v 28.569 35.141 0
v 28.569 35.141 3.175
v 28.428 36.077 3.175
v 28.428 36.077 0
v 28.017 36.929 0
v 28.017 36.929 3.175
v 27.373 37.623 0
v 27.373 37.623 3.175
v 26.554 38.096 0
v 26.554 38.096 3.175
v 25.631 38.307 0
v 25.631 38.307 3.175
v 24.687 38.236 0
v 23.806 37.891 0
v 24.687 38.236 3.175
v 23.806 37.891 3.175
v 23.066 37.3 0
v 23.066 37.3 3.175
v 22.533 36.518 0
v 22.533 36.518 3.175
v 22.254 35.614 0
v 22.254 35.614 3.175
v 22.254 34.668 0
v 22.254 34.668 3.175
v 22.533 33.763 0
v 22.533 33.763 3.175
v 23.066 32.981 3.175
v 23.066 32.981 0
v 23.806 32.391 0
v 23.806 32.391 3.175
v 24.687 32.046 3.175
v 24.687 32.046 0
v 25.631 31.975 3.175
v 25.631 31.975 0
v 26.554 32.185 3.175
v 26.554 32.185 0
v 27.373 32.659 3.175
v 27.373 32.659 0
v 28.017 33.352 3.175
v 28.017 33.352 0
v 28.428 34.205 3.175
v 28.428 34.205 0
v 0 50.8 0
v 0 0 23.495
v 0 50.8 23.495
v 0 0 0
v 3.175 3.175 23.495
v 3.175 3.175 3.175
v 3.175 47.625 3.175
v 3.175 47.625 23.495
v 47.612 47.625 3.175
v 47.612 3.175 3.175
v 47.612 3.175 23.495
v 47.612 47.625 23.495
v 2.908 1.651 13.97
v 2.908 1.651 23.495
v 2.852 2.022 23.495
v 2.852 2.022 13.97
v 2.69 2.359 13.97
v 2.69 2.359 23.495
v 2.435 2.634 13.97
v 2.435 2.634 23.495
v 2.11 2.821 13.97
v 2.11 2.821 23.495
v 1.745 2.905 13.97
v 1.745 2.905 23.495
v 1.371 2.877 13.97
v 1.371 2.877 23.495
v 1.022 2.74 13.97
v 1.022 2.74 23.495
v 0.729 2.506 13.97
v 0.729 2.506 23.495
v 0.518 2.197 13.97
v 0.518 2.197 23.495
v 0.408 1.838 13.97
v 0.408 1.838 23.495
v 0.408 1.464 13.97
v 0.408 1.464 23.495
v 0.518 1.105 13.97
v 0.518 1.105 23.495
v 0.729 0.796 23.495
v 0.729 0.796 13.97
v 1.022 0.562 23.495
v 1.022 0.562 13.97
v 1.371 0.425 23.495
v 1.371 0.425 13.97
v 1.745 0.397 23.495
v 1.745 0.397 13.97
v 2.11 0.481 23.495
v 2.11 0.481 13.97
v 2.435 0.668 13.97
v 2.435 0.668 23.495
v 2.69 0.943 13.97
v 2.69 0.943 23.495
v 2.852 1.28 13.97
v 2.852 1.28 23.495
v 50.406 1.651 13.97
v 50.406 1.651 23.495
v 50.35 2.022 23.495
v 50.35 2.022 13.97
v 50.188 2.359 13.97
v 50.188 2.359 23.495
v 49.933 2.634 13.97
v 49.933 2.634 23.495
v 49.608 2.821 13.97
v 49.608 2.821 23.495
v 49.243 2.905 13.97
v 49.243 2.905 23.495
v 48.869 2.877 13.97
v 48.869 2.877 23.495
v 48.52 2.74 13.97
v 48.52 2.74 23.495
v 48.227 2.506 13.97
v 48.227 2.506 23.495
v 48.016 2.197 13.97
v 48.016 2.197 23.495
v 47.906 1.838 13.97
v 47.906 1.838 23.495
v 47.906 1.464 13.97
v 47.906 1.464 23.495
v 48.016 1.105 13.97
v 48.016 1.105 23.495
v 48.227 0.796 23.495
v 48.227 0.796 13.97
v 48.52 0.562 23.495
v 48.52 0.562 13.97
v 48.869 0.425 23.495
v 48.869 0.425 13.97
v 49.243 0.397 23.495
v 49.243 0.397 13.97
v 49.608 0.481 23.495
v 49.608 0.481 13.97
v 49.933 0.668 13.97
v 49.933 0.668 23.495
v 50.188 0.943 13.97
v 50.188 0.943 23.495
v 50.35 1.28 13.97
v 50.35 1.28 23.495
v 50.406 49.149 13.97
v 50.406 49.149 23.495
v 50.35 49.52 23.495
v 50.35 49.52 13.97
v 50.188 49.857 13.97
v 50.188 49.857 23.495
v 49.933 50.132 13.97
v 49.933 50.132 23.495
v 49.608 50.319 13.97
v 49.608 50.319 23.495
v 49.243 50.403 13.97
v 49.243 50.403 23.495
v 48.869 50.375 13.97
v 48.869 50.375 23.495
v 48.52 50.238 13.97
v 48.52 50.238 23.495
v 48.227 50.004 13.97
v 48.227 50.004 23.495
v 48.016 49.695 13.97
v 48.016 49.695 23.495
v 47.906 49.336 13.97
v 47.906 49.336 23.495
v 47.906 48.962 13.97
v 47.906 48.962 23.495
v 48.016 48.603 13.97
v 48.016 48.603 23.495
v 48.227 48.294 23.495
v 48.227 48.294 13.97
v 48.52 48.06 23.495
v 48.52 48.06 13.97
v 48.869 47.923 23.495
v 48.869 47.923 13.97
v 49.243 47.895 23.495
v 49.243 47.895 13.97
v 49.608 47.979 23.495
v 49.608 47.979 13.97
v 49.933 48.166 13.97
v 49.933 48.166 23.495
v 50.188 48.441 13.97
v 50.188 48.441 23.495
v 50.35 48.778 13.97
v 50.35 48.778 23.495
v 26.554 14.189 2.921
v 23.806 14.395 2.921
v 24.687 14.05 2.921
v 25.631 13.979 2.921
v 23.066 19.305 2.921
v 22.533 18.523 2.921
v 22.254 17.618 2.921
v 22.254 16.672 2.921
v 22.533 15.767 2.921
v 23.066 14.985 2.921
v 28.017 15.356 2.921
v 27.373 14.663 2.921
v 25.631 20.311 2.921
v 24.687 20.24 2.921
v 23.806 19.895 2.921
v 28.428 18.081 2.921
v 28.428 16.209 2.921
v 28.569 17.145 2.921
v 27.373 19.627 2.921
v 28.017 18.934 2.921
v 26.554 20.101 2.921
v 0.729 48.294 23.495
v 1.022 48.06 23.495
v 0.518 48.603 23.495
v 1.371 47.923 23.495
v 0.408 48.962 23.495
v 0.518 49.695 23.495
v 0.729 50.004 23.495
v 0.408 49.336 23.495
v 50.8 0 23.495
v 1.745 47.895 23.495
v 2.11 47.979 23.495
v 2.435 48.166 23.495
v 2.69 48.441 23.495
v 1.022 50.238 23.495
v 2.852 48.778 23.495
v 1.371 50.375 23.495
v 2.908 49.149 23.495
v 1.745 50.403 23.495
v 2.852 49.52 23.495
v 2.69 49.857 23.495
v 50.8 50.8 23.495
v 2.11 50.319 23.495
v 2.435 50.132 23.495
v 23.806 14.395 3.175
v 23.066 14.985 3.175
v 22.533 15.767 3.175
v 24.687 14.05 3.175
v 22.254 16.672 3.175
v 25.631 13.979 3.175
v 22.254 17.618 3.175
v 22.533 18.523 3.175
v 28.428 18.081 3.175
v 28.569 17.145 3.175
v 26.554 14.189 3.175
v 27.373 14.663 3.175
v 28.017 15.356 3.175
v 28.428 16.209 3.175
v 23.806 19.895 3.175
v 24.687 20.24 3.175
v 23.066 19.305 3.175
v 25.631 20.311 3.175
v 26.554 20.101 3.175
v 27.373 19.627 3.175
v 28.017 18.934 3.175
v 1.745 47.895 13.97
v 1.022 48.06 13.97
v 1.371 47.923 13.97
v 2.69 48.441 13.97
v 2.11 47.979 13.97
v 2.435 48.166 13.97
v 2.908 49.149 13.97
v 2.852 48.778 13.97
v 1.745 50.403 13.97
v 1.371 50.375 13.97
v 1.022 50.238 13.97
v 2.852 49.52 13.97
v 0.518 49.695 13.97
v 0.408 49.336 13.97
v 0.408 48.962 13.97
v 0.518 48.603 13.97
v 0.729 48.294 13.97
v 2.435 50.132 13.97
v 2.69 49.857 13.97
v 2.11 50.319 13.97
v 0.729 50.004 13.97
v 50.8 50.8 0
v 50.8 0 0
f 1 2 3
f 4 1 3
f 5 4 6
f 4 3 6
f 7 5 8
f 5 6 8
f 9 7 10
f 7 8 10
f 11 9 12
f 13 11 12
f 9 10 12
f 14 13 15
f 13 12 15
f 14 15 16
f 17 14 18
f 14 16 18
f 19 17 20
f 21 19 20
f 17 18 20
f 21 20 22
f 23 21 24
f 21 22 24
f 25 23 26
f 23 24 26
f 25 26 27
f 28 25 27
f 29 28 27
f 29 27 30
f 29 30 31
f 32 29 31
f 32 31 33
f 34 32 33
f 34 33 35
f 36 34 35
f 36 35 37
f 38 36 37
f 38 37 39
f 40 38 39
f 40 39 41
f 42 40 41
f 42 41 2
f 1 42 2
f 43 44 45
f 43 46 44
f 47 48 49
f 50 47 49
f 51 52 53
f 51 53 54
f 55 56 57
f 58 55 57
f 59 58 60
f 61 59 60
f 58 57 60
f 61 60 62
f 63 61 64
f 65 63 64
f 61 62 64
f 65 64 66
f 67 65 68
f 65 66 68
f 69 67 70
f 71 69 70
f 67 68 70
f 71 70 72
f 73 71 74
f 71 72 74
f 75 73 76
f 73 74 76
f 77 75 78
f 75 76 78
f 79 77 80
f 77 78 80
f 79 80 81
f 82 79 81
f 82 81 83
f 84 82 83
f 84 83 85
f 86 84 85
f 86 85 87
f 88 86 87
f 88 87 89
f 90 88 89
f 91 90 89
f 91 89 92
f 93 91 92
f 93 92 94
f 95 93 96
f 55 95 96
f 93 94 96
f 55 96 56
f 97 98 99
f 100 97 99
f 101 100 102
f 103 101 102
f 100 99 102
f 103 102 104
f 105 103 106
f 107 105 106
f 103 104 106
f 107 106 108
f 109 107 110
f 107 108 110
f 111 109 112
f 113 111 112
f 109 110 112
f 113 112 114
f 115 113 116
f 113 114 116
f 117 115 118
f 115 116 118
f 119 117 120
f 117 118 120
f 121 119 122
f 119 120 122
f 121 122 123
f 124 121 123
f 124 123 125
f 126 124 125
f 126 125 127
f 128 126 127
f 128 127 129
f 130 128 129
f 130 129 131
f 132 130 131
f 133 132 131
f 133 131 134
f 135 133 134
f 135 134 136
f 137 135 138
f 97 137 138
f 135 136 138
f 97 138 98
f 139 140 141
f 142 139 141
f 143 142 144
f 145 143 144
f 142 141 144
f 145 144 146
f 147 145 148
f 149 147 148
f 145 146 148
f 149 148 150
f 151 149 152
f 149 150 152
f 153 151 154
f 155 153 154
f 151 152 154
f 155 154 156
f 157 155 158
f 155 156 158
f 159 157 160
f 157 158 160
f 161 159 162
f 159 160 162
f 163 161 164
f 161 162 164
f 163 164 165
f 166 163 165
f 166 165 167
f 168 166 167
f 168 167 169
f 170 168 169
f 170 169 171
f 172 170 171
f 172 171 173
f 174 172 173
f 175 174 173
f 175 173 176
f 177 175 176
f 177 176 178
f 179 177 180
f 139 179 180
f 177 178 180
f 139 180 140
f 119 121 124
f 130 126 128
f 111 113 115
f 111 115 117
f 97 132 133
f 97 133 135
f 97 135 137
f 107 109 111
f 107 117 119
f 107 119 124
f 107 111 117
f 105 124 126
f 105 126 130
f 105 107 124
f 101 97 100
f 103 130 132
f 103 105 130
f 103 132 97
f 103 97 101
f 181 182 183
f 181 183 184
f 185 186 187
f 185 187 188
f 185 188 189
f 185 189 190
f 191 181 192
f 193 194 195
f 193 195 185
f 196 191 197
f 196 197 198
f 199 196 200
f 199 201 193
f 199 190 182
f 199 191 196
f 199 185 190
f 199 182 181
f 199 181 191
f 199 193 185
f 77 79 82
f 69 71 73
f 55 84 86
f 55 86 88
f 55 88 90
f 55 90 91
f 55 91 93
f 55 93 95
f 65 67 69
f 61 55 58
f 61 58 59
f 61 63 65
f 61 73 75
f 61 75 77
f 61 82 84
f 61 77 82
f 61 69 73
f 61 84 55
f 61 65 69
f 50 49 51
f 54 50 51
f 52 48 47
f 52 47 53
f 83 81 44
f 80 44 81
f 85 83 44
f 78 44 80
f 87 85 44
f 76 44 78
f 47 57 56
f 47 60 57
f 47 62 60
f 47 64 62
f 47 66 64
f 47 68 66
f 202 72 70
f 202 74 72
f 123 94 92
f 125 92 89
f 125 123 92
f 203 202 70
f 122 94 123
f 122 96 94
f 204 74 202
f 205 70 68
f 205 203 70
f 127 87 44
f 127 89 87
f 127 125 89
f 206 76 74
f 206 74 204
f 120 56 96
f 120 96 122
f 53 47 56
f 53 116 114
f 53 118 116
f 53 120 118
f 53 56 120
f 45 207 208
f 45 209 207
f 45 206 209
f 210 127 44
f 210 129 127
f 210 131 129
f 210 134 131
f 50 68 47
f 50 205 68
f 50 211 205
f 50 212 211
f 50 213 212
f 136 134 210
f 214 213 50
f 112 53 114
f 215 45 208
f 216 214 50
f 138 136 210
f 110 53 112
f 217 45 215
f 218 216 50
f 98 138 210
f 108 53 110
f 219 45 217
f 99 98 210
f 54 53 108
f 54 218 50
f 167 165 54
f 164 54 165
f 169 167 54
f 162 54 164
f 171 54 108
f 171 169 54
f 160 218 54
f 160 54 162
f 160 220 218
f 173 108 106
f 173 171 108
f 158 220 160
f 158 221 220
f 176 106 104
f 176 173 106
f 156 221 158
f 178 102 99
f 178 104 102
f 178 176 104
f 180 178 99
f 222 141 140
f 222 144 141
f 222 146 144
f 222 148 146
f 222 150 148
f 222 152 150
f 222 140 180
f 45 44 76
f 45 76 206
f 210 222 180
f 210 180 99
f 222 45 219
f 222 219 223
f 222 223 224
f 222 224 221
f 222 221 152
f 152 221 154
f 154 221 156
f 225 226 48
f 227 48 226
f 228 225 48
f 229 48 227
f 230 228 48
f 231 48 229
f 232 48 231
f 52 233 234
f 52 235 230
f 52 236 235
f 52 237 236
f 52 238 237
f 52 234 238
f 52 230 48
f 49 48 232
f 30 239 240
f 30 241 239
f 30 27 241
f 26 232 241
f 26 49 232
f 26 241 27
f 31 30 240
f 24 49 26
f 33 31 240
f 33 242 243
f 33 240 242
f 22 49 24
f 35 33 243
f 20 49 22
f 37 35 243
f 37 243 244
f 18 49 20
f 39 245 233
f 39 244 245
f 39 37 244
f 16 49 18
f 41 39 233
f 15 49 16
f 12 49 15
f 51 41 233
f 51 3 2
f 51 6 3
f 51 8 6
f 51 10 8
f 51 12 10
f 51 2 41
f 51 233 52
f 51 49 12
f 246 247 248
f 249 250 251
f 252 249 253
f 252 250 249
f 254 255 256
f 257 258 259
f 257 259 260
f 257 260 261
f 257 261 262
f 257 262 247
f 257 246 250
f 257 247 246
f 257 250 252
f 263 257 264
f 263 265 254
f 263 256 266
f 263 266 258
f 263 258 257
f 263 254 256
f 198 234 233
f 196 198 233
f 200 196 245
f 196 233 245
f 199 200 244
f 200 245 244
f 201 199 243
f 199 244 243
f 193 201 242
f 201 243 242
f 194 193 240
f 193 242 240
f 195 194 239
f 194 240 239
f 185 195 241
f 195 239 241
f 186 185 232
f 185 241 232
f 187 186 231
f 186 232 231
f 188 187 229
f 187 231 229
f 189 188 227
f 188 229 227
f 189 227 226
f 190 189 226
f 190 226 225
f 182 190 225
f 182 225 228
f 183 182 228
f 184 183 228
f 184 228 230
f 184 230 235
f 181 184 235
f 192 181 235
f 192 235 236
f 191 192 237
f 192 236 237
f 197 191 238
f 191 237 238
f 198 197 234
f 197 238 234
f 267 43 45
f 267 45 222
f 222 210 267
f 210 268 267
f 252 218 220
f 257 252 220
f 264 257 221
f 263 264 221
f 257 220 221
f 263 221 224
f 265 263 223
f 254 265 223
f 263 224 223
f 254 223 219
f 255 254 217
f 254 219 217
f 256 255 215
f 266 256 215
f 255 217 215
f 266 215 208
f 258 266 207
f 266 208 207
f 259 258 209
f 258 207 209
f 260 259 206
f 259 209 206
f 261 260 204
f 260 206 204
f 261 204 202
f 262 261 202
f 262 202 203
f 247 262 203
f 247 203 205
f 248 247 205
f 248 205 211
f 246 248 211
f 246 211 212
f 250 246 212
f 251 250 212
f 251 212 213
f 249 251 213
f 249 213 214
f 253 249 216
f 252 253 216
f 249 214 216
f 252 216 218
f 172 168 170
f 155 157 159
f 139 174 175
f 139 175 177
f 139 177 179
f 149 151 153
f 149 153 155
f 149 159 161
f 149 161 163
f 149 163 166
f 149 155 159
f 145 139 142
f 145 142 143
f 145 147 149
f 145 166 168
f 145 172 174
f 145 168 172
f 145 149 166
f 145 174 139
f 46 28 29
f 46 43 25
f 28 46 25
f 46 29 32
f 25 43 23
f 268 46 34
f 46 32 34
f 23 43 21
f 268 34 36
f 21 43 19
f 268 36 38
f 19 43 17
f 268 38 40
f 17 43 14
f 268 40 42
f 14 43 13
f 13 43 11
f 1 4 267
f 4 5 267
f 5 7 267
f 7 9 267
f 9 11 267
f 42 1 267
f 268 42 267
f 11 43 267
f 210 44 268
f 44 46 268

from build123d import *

# Parameters (mm, degrees)
SKETCH1_W           = 50.8
SKETCH1_H           = 50.8
BOSS_EXTRUDE1_DEPTH = 3.175
SKETCH3_W           = 50.8
SKETCH3_H           = 50.8
SKETCH3_W_2         = 44.4373
SKETCH3_H_2         = 44.45
BOSS_EXTRUDE2_DEPTH = 20.32
SKETCH4_R           = 3.175
CUT_EXTRUDE1_DEPTH  = 0.254
SKETCH6_R           = 1.2573
CUT_EXTRUDE2_DEPTH  = 9.525
SKETCH4_3_R         = 3.175
CUT_EXTRUDE3_DEPTH  = 75.66044736


with BuildPart() as part:
    # Sketch1 → Boss-Extrude1 (new body)
    with BuildSketch(Plane.XY):
        with Locations((25.4, 25.4)):
            Rectangle(SKETCH1_W, SKETCH1_H)
    extrude(amount=BOSS_EXTRUDE1_DEPTH)

    # Sketch3 → Boss-Extrude2 (add)
    with BuildSketch(Plane.XY.offset(3.175)):
        with Locations((25.4, 25.4)):
            Rectangle(SKETCH3_W, SKETCH3_H)
        with Locations((25.39365, 25.4)):
            Rectangle(SKETCH3_W_2, SKETCH3_H_2, mode=Mode.SUBTRACT)
    extrude(amount=BOSS_EXTRUDE2_DEPTH)

    # Sketch4 → Cut-Extrude1 (cut)
    with BuildSketch(Plane.XY.offset(3.175)):
        with Locations((25.39365, 17.145)):
            Circle(SKETCH4_R)
    extrude(amount=-CUT_EXTRUDE1_DEPTH, mode=Mode.SUBTRACT)

    # Sketch6 → Cut-Extrude2 (cut)
    with BuildSketch(Plane.XY.offset(23.495)):
        with Locations((1.651, 49.149)):
            Circle(SKETCH6_R)
        with Locations((49.149, 49.149)):
            Circle(SKETCH6_R)
        with Locations((49.149, 1.651)):
            Circle(SKETCH6_R)
        with Locations((1.651, 1.651)):
            Circle(SKETCH6_R)
    extrude(amount=-CUT_EXTRUDE2_DEPTH, mode=Mode.SUBTRACT)

    # Sketch4<3> → Cut-Extrude3 (cut, through all)
    with BuildSketch(Plane.XY.offset(3.175)):
        with Locations((25.39365, 35.1409)):
            Circle(SKETCH4_3_R)
    extrude(amount=-CUT_EXTRUDE3_DEPTH, mode=Mode.SUBTRACT)


solid = part.part
